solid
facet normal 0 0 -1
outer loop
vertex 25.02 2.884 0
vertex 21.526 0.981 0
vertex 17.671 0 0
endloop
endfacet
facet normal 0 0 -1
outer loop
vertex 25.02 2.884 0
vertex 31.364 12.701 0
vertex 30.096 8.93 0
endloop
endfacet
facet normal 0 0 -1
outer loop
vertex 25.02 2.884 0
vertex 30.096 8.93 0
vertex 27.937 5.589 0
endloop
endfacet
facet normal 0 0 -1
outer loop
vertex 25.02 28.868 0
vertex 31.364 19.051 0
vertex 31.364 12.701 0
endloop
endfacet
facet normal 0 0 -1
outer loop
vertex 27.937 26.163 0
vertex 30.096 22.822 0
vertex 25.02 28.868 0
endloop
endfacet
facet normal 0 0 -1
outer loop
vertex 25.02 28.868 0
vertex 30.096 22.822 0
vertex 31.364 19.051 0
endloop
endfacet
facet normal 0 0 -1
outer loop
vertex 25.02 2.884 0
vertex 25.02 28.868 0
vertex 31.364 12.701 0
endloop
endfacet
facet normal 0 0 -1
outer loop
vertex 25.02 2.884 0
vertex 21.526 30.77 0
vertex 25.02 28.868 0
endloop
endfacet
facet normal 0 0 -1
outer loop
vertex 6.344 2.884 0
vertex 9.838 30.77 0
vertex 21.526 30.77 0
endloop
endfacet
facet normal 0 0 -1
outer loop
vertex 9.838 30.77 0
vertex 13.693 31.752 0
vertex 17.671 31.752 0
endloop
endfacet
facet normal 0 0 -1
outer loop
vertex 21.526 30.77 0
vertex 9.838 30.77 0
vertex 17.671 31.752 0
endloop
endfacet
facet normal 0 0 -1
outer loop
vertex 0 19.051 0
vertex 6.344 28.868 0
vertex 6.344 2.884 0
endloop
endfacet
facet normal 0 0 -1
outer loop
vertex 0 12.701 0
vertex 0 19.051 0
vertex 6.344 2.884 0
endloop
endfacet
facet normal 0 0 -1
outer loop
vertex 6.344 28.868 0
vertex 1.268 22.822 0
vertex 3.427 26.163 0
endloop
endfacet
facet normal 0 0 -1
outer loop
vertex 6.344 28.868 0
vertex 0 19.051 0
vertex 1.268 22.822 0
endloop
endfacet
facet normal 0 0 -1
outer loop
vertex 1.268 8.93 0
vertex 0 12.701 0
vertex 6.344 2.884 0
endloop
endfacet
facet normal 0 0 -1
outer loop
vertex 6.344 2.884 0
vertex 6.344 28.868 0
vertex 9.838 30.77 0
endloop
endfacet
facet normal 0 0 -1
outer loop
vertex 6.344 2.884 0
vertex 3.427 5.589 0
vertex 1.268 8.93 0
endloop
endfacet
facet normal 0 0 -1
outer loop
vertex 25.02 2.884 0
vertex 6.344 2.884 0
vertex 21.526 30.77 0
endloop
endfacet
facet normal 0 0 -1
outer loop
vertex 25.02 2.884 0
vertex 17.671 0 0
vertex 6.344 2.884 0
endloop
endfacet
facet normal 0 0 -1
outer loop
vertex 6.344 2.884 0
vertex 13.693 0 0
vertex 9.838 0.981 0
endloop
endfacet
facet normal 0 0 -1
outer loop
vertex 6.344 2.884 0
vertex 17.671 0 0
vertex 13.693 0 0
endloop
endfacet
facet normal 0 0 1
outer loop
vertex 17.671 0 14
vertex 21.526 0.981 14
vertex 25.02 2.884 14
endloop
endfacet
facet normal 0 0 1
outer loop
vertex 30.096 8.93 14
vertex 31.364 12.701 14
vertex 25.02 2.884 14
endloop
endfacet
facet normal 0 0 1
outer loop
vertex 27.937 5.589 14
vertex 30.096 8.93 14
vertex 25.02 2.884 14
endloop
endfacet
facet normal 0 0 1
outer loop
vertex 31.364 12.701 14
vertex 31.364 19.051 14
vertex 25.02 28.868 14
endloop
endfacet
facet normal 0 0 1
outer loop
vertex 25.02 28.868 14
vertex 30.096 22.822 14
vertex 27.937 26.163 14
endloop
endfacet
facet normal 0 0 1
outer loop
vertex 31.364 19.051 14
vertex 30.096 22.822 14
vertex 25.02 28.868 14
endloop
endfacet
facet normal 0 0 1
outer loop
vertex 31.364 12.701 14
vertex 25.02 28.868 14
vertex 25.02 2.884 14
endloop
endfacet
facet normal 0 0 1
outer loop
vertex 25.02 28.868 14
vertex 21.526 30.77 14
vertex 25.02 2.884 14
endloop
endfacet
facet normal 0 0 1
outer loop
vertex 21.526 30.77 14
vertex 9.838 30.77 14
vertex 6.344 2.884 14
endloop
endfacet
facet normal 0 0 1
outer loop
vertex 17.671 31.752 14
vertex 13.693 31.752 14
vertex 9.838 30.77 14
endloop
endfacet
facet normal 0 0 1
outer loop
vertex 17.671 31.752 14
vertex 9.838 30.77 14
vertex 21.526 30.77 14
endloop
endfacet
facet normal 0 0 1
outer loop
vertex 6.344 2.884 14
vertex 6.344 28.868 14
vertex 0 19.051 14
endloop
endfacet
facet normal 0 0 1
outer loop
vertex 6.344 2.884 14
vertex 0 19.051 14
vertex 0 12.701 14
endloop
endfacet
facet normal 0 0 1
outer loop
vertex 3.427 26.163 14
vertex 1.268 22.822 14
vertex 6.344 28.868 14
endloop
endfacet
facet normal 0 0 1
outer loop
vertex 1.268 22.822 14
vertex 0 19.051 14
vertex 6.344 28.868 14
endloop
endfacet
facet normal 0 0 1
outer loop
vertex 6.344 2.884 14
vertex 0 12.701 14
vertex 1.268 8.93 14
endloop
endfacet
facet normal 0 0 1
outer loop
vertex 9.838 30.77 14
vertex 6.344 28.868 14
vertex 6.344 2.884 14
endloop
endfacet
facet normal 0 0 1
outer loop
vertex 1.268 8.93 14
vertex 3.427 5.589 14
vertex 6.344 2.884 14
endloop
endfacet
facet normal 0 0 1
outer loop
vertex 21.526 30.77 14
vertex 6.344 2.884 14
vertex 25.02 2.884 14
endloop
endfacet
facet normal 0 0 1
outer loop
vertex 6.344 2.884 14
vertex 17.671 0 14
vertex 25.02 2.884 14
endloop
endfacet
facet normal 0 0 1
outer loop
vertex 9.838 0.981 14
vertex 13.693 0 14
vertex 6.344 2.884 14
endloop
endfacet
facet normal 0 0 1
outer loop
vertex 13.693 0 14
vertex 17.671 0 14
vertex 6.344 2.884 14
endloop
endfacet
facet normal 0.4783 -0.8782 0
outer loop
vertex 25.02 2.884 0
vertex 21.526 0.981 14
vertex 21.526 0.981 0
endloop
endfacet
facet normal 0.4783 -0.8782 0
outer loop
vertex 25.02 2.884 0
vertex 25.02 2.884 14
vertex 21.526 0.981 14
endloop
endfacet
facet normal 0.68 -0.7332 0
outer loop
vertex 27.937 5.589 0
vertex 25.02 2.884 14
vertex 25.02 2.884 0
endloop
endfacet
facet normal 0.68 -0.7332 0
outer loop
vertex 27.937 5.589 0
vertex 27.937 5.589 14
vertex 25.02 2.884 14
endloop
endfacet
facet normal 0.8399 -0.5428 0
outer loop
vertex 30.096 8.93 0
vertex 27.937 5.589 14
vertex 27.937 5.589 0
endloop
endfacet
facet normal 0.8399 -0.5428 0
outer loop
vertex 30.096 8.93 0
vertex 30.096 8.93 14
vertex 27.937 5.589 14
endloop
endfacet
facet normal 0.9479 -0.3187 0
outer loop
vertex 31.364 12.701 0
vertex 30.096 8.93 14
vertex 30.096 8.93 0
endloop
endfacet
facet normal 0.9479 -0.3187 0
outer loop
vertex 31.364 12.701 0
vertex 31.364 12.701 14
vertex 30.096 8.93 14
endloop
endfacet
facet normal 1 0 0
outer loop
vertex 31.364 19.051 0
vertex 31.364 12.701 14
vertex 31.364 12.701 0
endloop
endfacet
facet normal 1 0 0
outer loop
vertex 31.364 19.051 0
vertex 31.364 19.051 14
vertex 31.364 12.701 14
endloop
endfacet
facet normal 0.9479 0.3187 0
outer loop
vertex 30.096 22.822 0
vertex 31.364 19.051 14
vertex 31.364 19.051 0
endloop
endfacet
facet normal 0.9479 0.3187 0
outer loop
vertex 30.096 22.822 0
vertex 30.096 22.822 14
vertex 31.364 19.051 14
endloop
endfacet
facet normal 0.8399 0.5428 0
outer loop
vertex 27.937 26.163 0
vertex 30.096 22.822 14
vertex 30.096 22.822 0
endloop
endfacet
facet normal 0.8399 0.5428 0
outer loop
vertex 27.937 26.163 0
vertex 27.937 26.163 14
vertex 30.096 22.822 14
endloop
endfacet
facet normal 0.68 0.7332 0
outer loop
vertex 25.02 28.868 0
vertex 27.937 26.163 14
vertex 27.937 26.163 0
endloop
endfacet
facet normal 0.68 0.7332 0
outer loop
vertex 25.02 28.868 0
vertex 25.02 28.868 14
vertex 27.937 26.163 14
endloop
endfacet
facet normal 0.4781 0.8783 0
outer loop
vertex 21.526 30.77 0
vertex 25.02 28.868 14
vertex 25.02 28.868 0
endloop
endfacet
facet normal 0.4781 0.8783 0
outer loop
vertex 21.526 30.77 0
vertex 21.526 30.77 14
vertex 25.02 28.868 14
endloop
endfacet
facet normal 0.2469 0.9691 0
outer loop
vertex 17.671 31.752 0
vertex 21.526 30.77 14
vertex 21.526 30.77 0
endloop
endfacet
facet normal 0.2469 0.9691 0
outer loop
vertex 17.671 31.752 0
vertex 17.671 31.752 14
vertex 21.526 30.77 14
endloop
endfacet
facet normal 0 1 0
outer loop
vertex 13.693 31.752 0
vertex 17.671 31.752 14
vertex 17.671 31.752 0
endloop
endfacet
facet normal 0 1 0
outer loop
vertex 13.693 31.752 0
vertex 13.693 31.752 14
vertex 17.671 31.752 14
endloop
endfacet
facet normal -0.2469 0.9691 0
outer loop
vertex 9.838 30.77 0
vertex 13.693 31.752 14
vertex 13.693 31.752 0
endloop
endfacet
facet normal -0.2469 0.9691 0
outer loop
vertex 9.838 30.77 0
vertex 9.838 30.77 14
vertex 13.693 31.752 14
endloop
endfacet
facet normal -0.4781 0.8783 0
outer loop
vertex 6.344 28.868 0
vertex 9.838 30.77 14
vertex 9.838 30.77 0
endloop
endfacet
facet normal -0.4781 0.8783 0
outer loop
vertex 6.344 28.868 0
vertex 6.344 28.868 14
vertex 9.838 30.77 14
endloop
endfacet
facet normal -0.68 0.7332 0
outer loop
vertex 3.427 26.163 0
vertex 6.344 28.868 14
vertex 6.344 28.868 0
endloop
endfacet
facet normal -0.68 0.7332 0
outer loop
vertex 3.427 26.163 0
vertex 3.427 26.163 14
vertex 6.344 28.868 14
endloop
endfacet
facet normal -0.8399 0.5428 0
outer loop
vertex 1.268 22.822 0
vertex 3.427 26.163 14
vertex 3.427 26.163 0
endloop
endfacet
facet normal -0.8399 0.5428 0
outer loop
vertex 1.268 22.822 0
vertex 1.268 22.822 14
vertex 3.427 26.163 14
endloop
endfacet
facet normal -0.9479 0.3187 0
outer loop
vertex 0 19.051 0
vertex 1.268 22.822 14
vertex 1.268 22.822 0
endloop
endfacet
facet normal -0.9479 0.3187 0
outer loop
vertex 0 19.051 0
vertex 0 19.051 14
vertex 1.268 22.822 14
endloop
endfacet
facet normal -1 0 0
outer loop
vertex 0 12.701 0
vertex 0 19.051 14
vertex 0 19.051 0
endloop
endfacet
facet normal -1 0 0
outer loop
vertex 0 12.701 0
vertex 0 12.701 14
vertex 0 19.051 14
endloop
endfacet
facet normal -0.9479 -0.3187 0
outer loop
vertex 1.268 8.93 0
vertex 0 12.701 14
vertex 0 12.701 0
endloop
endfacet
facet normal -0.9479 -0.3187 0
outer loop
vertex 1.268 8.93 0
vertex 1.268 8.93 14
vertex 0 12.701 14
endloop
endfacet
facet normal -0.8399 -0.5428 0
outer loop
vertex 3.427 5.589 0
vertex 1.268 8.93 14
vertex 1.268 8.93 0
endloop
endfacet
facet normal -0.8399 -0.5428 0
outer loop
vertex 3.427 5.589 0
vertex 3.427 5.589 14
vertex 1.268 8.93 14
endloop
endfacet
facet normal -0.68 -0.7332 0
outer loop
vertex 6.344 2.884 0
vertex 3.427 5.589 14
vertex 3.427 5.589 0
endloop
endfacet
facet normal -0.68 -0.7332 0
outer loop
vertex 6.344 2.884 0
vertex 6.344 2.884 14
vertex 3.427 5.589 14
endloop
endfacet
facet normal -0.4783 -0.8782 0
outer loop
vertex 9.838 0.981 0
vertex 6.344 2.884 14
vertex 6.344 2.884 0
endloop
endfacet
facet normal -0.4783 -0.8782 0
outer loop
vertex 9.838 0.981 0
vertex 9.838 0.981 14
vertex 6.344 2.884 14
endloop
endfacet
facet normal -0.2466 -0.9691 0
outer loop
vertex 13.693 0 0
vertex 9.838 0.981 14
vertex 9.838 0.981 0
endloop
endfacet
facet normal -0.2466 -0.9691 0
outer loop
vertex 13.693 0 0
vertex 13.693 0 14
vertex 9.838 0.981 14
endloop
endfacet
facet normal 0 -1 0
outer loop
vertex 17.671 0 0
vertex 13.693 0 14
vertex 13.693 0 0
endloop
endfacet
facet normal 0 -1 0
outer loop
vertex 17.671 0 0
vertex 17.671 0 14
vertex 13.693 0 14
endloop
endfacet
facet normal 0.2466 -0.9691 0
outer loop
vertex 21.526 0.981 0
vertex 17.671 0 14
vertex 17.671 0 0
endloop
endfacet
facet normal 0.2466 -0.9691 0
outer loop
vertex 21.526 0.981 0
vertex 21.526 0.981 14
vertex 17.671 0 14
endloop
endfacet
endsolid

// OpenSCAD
$fn = 32;

// ----------------------------------------------------------------------
// Flat adaptor: double_d, 14 mm thick
// ----------------------------------------------------------------------

// --- parameters (mm) ---
profile_height = 14;      // extrusion height
profile_points = 24;      // points of the closed outline

profile = [[31.364, 19.051], [30.096, 22.822], [27.937, 26.163], [25.02, 28.868], [21.526, 30.77], [17.671, 31.752], [13.693, 31.752], [9.838, 30.77], [6.344, 28.868], [3.427, 26.163], [1.268, 22.822], [0, 19.051], [0, 12.701], [1.268, 8.93], [3.427, 5.589], [6.344, 2.884], [9.838, 0.981], [13.693, 0], [17.671, 0], [21.526, 0.981], [25.02, 2.884], [27.937, 5.589], [30.096, 8.93], [31.364, 12.701]];  // single closed polygon, 24 points, counter clockwise

// --- the one profile operation ---
linear_extrude(height = profile_height) polygon(points = profile);
